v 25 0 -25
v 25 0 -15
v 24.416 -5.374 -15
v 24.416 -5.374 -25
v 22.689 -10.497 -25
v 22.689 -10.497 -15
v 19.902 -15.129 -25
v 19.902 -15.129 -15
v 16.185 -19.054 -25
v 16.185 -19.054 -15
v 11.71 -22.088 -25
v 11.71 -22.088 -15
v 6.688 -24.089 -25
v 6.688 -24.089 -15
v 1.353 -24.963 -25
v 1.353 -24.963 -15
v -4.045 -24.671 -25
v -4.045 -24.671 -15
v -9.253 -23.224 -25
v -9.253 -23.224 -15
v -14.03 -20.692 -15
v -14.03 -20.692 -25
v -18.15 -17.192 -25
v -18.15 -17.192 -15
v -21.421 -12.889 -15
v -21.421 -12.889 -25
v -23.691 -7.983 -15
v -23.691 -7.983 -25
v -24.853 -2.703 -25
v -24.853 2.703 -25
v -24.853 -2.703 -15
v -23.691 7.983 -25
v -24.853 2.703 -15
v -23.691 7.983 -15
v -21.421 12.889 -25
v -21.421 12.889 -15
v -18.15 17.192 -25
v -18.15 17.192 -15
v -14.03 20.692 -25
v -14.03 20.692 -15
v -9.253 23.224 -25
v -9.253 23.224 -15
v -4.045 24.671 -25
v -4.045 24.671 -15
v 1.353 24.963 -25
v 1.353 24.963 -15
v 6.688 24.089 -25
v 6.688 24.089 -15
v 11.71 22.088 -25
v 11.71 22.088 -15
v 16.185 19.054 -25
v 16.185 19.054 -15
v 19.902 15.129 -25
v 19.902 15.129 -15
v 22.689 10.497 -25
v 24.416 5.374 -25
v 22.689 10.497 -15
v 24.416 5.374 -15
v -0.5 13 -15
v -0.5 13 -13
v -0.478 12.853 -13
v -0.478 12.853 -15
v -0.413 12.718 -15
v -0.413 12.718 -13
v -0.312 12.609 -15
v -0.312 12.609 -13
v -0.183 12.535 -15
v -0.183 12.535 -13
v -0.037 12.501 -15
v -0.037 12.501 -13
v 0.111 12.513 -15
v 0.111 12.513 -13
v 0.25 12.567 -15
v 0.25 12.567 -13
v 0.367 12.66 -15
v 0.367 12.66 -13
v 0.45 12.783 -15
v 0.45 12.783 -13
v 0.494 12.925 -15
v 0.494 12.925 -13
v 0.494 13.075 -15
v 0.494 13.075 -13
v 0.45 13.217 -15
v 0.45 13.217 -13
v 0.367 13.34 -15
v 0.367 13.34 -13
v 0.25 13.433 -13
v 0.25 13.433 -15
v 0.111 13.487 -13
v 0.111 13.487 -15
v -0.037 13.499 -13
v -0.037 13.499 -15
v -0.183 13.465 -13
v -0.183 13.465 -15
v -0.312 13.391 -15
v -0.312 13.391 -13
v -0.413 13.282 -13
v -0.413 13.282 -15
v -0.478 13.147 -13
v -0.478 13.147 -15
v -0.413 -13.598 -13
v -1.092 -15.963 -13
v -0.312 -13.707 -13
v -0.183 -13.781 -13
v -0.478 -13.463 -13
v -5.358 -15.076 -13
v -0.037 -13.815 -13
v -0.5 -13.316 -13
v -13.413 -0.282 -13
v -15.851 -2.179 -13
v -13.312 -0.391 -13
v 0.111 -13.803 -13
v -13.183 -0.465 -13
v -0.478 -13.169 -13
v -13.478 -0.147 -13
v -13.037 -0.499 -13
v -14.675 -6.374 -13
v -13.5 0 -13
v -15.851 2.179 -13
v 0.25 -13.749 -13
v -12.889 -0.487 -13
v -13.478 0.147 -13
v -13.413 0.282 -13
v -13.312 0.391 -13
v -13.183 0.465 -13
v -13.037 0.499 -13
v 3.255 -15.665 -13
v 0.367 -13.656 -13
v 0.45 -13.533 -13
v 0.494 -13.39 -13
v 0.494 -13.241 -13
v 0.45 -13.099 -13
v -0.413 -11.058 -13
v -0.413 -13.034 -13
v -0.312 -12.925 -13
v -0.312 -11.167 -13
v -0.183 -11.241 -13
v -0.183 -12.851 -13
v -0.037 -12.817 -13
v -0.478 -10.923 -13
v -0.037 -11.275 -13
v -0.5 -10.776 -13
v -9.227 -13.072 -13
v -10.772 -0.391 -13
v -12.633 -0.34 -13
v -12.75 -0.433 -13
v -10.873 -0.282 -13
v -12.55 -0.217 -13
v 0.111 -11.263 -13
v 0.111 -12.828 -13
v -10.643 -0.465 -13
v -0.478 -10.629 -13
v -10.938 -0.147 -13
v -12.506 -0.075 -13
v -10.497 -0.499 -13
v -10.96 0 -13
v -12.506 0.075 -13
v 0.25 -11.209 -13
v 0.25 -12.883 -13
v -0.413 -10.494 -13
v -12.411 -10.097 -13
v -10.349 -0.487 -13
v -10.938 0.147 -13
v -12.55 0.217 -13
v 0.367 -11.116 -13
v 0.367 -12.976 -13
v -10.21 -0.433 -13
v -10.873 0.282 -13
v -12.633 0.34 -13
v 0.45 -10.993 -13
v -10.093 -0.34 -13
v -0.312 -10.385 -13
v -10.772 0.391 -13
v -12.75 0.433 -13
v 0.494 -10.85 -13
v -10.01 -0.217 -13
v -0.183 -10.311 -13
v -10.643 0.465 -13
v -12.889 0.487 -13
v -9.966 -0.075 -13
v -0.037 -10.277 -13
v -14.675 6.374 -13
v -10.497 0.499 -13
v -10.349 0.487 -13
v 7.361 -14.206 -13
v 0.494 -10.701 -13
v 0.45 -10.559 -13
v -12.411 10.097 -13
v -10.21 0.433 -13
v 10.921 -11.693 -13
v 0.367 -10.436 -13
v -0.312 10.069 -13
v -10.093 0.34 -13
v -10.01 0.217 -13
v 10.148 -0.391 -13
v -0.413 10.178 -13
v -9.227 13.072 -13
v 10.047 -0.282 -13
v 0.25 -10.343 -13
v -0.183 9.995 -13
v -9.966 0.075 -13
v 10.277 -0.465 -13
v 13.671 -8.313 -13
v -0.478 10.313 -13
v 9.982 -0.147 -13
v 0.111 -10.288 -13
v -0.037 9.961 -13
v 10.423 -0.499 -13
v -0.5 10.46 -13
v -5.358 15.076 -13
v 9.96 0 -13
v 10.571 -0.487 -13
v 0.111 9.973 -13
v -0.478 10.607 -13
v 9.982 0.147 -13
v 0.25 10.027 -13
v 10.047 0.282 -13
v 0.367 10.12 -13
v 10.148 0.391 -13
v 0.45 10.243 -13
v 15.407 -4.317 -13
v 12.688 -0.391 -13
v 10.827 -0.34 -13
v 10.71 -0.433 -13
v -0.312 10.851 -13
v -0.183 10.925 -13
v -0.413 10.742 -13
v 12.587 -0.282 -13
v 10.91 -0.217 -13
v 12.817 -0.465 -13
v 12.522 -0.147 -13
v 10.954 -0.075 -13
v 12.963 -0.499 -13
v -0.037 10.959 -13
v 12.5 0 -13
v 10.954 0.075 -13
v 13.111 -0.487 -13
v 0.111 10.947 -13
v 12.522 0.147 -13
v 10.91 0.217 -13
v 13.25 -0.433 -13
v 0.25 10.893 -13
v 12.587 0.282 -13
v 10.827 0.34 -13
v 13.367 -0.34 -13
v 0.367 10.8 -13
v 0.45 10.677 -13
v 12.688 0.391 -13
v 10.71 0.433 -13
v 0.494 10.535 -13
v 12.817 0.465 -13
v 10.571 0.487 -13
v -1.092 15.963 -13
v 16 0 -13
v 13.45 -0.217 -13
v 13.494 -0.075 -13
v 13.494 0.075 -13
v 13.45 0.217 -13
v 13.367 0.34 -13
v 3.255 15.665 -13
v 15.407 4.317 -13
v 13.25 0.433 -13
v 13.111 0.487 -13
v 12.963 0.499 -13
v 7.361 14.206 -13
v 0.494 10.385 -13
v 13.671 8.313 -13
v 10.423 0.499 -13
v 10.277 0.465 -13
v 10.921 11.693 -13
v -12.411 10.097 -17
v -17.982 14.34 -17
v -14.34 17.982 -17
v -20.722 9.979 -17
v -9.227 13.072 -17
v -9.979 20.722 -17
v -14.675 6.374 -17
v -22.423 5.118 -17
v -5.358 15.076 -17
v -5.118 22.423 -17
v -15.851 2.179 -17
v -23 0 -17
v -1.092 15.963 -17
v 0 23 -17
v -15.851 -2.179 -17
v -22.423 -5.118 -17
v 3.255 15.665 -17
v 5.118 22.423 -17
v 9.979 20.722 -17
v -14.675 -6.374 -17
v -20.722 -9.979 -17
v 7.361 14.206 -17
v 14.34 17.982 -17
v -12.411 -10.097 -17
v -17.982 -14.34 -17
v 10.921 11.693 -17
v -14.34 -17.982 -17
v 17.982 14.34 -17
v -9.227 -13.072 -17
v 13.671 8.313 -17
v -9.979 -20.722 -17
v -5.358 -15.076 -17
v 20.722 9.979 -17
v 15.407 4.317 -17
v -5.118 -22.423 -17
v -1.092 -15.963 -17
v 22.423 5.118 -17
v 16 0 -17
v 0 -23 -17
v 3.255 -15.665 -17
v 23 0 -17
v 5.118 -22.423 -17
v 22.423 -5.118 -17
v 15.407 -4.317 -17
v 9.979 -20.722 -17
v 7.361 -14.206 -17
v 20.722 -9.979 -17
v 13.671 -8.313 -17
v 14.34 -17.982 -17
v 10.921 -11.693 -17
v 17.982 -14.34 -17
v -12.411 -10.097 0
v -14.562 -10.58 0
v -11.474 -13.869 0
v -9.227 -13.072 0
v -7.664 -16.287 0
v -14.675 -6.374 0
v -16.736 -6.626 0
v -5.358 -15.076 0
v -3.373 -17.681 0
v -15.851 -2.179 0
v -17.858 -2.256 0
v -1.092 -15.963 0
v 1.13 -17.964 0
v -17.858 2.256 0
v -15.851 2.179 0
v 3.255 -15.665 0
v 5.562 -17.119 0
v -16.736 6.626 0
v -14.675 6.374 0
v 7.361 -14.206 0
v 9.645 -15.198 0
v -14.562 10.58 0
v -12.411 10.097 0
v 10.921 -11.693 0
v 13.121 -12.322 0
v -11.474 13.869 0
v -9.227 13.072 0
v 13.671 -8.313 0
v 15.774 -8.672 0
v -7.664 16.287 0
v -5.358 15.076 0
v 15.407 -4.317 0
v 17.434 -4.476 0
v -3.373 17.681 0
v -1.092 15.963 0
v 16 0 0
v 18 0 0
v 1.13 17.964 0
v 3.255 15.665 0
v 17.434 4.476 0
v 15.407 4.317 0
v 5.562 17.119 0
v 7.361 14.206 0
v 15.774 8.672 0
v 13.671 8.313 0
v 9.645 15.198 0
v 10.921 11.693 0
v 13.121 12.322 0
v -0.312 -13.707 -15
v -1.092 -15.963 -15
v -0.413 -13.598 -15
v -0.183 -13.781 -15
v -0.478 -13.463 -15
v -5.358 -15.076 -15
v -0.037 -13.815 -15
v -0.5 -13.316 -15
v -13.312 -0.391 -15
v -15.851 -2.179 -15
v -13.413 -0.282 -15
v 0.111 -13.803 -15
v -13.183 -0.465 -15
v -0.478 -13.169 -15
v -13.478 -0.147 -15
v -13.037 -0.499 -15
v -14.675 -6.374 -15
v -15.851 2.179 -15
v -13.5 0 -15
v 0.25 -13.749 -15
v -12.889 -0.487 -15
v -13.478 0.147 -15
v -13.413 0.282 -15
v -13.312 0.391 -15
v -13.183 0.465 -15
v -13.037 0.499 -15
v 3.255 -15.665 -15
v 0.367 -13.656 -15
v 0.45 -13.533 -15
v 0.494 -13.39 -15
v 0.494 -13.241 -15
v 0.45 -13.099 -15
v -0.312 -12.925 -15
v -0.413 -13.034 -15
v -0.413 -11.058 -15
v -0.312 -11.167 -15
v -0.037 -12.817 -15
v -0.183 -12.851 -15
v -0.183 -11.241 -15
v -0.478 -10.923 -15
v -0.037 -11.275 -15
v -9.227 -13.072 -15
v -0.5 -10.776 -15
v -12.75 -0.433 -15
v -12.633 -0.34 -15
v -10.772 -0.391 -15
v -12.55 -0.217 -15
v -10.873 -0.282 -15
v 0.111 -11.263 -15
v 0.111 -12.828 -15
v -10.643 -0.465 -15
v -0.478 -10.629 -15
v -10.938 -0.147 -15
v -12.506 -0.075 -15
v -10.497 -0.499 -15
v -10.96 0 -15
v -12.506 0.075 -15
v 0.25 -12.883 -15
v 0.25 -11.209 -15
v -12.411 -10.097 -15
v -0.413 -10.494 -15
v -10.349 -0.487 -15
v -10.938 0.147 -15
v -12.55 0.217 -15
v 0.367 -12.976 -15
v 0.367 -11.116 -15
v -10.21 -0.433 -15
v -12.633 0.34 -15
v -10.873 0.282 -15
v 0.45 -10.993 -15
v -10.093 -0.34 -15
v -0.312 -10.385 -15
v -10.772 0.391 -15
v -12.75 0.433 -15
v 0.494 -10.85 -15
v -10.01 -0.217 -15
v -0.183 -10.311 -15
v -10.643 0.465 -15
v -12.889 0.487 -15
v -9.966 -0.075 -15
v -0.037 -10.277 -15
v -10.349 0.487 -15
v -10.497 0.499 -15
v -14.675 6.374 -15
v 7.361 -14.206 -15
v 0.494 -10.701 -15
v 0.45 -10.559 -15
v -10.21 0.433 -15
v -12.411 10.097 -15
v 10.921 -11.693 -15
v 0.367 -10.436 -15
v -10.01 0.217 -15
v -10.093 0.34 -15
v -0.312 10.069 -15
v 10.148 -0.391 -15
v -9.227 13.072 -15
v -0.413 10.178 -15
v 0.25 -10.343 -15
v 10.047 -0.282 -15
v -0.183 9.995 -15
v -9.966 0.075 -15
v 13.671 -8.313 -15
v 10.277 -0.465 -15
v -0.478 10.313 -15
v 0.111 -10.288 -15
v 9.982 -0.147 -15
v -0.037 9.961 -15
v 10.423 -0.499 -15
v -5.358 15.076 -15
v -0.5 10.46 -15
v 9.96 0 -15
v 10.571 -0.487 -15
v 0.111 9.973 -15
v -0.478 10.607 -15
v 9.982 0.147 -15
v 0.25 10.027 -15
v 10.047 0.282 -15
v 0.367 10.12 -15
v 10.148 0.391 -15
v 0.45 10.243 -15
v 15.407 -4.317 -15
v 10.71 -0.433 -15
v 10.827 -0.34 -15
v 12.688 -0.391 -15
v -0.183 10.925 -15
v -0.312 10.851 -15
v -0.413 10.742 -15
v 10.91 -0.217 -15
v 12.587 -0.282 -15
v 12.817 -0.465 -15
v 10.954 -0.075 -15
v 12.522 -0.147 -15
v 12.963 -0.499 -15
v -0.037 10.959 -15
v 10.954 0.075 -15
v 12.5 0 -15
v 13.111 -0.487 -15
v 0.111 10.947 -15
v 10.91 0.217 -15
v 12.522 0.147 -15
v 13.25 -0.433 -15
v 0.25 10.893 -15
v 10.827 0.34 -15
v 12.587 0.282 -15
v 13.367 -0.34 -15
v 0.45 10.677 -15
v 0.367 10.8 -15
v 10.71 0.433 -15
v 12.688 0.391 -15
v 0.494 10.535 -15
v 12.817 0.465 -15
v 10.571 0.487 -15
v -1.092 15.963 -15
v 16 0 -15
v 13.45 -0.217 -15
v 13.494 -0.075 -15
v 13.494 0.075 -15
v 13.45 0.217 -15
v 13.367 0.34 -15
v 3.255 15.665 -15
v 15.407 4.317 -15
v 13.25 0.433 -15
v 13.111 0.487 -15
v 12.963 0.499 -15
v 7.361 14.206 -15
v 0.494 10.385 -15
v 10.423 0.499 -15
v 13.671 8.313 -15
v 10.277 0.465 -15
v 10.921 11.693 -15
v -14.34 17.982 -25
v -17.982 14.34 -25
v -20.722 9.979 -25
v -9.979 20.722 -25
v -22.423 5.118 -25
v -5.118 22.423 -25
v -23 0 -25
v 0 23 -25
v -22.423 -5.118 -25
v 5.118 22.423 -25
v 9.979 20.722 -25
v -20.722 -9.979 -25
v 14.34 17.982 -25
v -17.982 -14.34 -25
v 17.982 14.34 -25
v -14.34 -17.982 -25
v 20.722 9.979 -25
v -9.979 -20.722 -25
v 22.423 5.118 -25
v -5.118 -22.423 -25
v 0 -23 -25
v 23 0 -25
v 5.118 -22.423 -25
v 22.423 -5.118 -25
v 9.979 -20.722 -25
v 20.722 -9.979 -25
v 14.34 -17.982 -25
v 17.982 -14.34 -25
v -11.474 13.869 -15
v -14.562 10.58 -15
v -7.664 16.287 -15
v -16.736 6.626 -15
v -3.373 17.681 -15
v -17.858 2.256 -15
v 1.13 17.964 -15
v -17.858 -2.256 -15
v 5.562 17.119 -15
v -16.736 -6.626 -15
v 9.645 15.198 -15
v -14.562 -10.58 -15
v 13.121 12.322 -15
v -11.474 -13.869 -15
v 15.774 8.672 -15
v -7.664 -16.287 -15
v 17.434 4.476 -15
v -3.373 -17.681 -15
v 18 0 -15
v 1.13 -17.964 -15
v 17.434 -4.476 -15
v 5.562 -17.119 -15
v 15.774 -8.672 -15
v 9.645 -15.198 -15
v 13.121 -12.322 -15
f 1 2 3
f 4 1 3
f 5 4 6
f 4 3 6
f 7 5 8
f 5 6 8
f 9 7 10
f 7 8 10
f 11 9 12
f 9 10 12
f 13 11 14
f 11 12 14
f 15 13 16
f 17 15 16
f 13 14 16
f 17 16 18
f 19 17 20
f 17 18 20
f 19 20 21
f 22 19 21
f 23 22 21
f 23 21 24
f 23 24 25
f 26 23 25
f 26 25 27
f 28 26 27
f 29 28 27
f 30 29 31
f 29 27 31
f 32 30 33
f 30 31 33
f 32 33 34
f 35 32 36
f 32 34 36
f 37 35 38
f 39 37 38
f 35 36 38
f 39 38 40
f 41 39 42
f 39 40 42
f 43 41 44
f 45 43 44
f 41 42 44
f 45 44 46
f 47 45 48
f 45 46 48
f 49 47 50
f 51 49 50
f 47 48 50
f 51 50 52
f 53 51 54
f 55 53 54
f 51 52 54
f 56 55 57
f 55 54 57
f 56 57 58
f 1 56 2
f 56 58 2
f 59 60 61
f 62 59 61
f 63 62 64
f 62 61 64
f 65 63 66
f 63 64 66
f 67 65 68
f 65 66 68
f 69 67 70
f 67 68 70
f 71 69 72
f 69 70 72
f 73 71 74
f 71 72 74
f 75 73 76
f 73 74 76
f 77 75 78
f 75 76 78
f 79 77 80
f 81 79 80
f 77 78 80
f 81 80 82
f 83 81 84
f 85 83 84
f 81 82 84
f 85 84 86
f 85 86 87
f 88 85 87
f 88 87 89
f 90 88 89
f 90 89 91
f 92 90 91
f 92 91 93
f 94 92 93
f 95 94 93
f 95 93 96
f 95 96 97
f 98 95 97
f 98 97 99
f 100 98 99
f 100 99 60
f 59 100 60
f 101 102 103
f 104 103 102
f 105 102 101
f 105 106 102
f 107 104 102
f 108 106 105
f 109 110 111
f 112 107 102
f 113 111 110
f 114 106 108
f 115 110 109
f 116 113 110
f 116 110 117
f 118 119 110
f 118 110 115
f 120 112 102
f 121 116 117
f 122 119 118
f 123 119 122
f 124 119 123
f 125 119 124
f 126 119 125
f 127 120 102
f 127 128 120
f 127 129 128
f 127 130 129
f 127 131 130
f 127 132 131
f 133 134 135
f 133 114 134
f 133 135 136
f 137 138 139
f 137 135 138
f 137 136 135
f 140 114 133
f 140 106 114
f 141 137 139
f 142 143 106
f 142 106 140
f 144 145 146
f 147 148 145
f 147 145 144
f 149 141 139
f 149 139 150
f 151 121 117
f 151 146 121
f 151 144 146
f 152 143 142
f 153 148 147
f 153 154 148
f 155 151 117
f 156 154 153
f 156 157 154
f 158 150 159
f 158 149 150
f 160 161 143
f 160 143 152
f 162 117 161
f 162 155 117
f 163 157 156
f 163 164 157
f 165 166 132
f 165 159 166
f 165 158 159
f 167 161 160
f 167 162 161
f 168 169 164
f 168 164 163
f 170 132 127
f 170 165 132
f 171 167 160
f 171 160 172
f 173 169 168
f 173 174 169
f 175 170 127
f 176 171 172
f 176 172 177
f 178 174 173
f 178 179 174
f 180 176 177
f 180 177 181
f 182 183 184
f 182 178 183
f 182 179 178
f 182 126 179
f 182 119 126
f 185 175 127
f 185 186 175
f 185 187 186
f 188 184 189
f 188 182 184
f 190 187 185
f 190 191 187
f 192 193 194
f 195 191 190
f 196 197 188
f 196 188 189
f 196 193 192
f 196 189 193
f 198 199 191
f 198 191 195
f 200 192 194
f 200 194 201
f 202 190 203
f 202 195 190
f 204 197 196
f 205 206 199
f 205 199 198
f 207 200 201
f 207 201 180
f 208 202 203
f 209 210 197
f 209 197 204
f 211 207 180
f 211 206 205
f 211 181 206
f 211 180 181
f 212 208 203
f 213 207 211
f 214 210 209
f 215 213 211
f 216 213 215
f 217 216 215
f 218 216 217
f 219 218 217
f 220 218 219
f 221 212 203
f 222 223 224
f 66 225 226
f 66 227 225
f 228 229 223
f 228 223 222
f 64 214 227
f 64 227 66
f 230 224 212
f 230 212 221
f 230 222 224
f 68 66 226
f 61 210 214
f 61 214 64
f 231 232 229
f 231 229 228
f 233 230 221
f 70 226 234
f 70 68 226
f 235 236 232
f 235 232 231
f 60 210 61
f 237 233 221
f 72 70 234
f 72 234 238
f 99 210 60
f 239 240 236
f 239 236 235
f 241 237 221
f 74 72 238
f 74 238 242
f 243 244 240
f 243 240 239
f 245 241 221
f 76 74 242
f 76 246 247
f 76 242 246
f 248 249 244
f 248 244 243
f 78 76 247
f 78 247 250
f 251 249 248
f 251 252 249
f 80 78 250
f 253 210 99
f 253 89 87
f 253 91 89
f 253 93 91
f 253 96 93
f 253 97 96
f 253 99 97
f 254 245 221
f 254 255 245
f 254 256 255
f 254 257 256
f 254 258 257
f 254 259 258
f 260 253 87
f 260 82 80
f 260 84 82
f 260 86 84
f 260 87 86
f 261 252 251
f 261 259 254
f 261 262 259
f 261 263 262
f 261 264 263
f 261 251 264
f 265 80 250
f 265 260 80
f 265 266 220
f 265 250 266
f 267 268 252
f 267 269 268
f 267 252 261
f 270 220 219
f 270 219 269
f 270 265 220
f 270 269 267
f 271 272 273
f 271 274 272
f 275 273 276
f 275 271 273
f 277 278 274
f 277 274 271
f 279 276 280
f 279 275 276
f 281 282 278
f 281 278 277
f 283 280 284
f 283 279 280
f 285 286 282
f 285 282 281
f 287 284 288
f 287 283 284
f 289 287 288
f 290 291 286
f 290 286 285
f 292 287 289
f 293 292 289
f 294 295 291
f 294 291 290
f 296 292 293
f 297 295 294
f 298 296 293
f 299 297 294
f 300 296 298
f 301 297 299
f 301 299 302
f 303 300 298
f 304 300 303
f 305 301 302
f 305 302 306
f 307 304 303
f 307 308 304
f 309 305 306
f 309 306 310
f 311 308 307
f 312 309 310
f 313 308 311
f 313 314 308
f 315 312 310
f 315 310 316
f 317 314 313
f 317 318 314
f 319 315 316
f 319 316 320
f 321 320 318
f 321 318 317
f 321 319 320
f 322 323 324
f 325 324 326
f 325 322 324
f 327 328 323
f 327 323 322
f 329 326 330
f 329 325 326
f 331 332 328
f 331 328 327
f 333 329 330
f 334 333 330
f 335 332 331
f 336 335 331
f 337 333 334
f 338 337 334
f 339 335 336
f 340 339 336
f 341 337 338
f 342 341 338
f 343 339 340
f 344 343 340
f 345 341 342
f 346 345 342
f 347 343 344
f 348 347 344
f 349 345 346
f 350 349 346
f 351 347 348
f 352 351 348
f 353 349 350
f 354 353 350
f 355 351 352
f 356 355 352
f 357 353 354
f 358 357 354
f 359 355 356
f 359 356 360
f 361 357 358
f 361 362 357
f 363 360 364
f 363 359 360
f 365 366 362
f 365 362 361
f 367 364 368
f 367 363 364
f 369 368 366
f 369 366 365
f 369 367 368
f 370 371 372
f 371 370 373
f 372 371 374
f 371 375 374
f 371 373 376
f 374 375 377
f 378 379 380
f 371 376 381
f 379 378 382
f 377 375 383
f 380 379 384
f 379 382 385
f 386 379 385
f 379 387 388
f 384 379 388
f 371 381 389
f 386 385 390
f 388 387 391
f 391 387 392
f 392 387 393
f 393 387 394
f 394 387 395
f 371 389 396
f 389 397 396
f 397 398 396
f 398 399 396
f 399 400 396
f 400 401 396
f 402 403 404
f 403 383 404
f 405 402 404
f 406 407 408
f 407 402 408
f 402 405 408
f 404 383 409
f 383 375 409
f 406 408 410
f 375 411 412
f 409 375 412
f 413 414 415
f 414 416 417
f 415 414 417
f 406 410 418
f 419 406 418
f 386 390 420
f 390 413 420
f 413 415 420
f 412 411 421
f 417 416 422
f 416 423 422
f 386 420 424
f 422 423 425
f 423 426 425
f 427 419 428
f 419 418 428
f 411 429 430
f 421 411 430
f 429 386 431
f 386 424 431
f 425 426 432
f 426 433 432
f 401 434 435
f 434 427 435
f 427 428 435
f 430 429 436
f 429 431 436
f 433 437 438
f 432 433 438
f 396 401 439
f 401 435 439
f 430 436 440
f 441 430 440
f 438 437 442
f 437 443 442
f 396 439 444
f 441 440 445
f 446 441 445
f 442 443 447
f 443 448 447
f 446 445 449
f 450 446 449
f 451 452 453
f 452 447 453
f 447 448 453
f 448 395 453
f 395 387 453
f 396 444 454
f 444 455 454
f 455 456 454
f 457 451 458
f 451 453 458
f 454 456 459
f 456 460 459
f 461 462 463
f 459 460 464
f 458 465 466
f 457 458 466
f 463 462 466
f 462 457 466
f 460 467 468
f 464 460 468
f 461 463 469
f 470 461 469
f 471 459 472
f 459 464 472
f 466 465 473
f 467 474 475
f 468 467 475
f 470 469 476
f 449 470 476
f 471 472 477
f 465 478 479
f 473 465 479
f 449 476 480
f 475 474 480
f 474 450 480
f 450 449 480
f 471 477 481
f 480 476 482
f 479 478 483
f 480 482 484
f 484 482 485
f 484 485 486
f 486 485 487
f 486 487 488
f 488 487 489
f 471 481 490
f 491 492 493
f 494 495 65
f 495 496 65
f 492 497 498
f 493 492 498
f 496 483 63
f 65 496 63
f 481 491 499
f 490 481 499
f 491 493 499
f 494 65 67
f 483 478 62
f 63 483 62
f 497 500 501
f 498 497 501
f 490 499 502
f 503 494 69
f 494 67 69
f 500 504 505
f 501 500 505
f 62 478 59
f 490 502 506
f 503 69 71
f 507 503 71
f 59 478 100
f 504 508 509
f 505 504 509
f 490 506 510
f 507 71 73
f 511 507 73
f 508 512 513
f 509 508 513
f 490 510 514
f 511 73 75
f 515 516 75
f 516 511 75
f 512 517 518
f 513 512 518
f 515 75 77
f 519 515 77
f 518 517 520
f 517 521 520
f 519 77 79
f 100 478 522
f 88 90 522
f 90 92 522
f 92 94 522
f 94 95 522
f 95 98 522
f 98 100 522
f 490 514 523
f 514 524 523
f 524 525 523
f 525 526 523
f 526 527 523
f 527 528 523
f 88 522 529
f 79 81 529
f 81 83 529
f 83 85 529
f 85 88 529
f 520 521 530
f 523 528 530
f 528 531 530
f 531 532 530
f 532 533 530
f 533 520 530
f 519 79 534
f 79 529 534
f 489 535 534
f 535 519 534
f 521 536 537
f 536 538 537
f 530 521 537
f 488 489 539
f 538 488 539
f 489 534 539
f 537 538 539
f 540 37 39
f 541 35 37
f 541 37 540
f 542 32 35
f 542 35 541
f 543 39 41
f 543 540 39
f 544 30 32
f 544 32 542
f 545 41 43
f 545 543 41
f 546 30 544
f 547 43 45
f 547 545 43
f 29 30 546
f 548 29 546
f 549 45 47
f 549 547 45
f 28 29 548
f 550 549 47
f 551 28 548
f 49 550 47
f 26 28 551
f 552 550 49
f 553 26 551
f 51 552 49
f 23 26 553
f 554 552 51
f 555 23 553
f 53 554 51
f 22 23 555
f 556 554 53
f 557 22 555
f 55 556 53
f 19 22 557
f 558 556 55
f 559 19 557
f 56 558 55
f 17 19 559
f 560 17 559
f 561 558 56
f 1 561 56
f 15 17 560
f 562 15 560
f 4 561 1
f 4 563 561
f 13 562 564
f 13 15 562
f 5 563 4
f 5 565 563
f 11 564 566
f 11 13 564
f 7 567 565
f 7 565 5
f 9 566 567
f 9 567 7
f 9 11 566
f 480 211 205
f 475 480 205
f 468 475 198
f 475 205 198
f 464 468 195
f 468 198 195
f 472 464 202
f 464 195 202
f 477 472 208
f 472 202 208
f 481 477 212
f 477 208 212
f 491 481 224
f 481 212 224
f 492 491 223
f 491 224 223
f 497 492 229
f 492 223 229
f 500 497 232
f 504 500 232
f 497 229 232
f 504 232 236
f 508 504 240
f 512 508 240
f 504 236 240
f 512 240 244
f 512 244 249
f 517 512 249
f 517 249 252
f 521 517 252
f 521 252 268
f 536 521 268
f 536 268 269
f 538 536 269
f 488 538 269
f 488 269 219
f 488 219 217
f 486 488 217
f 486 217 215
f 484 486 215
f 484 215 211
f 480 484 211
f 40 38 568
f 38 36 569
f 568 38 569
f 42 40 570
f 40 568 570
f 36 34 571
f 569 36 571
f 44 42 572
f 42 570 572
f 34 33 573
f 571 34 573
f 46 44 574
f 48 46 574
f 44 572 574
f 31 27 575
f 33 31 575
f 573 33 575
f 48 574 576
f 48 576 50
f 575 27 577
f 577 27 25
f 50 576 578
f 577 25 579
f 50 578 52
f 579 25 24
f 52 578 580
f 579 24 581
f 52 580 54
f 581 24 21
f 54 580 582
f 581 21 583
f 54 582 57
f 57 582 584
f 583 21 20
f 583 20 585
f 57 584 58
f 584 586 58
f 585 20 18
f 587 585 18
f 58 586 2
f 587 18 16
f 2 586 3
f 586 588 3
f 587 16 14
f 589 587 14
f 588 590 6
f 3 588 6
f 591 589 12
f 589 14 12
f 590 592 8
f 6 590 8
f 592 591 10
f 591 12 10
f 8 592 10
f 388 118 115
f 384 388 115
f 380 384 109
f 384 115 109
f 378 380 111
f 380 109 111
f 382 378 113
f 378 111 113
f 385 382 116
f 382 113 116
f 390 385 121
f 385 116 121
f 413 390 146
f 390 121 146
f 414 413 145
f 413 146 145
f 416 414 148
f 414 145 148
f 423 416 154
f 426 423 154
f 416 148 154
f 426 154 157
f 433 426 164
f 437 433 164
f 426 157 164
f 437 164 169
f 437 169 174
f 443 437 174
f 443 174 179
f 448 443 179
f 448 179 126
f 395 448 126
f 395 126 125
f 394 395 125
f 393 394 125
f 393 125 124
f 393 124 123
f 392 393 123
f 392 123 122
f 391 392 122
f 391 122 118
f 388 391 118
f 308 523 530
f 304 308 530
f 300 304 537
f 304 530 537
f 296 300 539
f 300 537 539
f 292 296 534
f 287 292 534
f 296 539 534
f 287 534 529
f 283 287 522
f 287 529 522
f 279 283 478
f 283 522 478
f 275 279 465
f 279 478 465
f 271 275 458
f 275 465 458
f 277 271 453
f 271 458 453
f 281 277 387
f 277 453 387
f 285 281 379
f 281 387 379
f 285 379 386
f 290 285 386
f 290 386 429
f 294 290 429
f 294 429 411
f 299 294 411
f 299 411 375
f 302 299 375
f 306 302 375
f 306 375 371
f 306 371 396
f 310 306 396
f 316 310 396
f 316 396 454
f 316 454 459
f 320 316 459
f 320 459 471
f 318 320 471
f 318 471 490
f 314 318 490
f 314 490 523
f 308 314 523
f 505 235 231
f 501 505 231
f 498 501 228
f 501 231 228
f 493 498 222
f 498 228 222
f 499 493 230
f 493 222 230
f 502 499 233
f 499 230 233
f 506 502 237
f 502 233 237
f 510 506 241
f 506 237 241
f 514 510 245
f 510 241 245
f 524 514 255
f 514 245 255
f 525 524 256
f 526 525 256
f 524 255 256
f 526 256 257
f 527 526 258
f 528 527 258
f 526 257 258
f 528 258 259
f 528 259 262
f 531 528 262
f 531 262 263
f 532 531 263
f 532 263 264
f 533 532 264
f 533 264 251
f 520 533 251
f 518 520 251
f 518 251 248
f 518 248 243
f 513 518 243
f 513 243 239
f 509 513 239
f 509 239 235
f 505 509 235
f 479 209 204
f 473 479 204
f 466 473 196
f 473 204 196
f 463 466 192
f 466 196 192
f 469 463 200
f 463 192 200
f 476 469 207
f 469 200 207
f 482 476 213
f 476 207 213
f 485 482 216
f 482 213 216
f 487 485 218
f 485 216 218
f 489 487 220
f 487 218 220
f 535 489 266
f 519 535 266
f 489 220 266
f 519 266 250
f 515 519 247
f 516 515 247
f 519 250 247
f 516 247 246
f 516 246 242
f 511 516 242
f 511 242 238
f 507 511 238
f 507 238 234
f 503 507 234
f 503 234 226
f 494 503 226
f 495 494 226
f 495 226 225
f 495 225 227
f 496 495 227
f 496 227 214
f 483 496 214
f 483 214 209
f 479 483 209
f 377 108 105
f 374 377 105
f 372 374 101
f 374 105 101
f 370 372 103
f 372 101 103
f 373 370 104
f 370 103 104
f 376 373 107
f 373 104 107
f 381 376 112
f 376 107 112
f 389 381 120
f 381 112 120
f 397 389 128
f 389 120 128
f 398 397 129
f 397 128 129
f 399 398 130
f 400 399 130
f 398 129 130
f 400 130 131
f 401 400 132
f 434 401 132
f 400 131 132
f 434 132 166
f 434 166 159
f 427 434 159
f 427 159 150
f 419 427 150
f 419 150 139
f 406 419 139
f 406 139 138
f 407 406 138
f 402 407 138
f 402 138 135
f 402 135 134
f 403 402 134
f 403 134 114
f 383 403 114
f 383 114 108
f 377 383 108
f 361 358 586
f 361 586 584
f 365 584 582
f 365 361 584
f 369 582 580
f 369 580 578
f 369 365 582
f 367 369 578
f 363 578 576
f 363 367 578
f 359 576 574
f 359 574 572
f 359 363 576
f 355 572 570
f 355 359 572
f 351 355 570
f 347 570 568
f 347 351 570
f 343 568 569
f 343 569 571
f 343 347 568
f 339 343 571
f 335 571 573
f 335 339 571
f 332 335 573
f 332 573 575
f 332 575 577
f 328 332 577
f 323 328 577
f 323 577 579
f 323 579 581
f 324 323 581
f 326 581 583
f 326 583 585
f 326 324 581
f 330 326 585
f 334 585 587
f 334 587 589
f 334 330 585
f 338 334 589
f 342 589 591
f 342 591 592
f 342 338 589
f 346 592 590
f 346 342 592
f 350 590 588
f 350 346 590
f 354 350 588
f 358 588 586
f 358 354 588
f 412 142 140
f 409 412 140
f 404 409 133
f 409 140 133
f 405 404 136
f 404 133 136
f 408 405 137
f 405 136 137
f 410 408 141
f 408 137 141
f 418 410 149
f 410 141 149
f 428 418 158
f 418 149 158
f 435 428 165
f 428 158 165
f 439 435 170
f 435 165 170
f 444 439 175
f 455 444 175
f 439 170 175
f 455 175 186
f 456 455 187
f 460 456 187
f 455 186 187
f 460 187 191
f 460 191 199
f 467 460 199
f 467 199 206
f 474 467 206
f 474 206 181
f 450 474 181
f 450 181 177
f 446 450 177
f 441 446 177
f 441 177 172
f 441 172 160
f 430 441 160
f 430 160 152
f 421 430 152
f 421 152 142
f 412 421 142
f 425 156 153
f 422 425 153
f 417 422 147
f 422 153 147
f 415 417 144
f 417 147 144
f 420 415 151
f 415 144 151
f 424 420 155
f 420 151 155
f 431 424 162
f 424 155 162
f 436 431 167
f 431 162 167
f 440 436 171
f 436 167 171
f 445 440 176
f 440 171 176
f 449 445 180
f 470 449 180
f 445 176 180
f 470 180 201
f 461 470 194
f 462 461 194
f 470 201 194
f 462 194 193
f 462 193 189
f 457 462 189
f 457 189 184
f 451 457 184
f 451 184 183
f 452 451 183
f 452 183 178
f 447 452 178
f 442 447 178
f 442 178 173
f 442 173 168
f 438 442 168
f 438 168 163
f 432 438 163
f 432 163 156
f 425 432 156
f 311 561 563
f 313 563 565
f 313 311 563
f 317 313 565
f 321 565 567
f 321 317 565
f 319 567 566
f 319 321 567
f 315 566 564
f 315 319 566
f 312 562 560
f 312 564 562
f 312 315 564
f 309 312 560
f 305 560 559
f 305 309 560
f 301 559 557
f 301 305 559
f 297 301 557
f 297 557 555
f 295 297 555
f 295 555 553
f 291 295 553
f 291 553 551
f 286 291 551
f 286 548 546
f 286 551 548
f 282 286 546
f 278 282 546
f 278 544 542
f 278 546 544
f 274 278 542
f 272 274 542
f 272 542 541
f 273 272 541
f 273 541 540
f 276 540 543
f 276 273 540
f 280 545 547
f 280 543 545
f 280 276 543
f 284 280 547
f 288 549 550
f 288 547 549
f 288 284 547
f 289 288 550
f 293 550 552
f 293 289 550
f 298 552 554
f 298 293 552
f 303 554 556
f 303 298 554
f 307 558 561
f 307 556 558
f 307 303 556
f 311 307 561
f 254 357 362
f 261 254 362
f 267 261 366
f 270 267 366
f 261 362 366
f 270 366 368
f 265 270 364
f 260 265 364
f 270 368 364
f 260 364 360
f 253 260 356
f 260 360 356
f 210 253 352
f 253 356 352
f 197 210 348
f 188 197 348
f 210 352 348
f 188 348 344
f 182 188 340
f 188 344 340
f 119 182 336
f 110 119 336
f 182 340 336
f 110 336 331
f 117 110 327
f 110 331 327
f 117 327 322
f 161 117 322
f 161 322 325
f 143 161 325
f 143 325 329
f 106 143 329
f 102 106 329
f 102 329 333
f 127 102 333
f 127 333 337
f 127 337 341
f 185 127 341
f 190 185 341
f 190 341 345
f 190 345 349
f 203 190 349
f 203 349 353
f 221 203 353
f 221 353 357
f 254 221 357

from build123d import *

# Parameters (mm, degrees)
F0_R     = 18
F1_DEPTH = 15
F2_T     = -2
F3_R     = 25
F4_DEPTH = 10
F5_T     = -2
F7_D     = 1
F8_D     = 1
F9_D     = 1
F10_D    = 1
F11_D    = 1
F12_D    = 1
F13_D    = 1
F14_D    = 1


with BuildPart() as f1:
    # F0 (on Top) → F1 (new body)
    with BuildSketch(Plane.XY):
        Circle(F0_R)
    extrude(amount=-F1_DEPTH)

    # F2
    f2_openings = [f1.faces().sort_by_distance(p)[0] for p in [
        (0, 0, 0),
    ]]
    offset(amount=F2_T, openings=f2_openings)

    # F3 (on face) → F4 (join)
    with BuildSketch(Plane(origin=(0, 0, -15), x_dir=(1, 0, 0), z_dir=(0, 0, -1))):
        Circle(F3_R)
    extrude(amount=F4_DEPTH)

    # F5
    f5_openings = [f1.faces().sort_by_distance(p)[0] for p in [
        (0, 0, -25),
    ]]
    offset(amount=F5_T, openings=f5_openings, kind=Kind.INTERSECTION)

    # F7 (through all)
    with Locations(Plane(origin=(0, 0, -15), x_dir=(1, 0, 0), z_dir=(0, 0, -1))):
        with Locations((0, -13)):
            Hole(F7_D / 2)

    # F8 (through all)
    with Locations(Plane(origin=(0, 0, -15), x_dir=(1, 0, 0), z_dir=(0, 0, -1))):
        with Locations((0, -10.46)):
            Hole(F8_D / 2)

    # F9 (through all)
    with Locations(Plane(origin=(0, 0, -15), x_dir=(1, 0, 0), z_dir=(0, 0, -1))):
        with Locations((-13, 0)):
            Hole(F9_D / 2)

    # F10 (through all)
    with Locations(Plane(origin=(0, 0, -15), x_dir=(1, 0, 0), z_dir=(0, 0, -1))):
        with Locations((-10.46, 0)):
            Hole(F10_D / 2)

    # F11 (through all)
    with Locations(Plane(origin=(0, 0, -15), x_dir=(1, 0, 0), z_dir=(0, 0, -1))):
        with Locations((0, 13.3159505203)):
            Hole(F11_D / 2)

    # F12 (through all)
    with Locations(Plane(origin=(0, 0, -15), x_dir=(1, 0, 0), z_dir=(0, 0, -1))):
        with Locations((0, 10.7759505203)):
            Hole(F12_D / 2)

    # F13 (through all)
    with Locations(Plane(origin=(0, 0, -15), x_dir=(1, 0, 0), z_dir=(0, 0, -1))):
        with Locations((13, 0)):
            Hole(F13_D / 2)

    # F14 (through all)
    with Locations(Plane(origin=(0, 0, -15), x_dir=(1, 0, 0), z_dir=(0, 0, -1))):
        with Locations((10.46, 0)):
            Hole(F14_D / 2)


solid = f1.part
